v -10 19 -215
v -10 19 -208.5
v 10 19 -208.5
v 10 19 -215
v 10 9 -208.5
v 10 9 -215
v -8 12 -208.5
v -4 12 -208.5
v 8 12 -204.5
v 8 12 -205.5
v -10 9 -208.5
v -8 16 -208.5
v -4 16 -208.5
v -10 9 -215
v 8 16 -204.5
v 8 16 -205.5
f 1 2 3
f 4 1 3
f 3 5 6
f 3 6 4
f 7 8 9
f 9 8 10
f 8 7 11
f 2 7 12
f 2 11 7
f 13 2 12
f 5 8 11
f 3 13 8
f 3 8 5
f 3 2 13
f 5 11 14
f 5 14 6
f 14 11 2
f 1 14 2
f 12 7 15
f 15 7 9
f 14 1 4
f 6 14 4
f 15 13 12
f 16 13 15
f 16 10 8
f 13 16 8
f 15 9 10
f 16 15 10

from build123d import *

# Parameters (mm, degrees)
BOITIER_MICROSWITCH_START = -208.5
ESQUISSE1_W               = 20
ESQUISSE1_H               = 10
BOITIER_MICROSWITCH_DEPTH = 6.5
LEVIER_DETECTION_START    = 12
LEVIER_DETECTION_DEPTH    = 4


with BuildPart() as part:
    # Esquisse1 → Boitier_microswitch (new body)
    with BuildSketch(Plane.XY.offset(BOITIER_MICROSWITCH_START)):
        with Locations((0, 14)):
            Rectangle(ESQUISSE1_W, ESQUISSE1_H)
    extrude(amount=-BOITIER_MICROSWITCH_DEPTH)

    # Esquisse2 → Levier_detection (add)
    with BuildSketch(Plane(origin=(0, 0, 0), x_dir=(1, 0, 0), z_dir=(0, 1, 0)).offset(LEVIER_DETECTION_START)):
        Polygon((-8, 208.5), (8, 204.5), (8, 205.5), (-8, 209.5), align=None)
    extrude(amount=LEVIER_DETECTION_DEPTH)


solid = part.part
